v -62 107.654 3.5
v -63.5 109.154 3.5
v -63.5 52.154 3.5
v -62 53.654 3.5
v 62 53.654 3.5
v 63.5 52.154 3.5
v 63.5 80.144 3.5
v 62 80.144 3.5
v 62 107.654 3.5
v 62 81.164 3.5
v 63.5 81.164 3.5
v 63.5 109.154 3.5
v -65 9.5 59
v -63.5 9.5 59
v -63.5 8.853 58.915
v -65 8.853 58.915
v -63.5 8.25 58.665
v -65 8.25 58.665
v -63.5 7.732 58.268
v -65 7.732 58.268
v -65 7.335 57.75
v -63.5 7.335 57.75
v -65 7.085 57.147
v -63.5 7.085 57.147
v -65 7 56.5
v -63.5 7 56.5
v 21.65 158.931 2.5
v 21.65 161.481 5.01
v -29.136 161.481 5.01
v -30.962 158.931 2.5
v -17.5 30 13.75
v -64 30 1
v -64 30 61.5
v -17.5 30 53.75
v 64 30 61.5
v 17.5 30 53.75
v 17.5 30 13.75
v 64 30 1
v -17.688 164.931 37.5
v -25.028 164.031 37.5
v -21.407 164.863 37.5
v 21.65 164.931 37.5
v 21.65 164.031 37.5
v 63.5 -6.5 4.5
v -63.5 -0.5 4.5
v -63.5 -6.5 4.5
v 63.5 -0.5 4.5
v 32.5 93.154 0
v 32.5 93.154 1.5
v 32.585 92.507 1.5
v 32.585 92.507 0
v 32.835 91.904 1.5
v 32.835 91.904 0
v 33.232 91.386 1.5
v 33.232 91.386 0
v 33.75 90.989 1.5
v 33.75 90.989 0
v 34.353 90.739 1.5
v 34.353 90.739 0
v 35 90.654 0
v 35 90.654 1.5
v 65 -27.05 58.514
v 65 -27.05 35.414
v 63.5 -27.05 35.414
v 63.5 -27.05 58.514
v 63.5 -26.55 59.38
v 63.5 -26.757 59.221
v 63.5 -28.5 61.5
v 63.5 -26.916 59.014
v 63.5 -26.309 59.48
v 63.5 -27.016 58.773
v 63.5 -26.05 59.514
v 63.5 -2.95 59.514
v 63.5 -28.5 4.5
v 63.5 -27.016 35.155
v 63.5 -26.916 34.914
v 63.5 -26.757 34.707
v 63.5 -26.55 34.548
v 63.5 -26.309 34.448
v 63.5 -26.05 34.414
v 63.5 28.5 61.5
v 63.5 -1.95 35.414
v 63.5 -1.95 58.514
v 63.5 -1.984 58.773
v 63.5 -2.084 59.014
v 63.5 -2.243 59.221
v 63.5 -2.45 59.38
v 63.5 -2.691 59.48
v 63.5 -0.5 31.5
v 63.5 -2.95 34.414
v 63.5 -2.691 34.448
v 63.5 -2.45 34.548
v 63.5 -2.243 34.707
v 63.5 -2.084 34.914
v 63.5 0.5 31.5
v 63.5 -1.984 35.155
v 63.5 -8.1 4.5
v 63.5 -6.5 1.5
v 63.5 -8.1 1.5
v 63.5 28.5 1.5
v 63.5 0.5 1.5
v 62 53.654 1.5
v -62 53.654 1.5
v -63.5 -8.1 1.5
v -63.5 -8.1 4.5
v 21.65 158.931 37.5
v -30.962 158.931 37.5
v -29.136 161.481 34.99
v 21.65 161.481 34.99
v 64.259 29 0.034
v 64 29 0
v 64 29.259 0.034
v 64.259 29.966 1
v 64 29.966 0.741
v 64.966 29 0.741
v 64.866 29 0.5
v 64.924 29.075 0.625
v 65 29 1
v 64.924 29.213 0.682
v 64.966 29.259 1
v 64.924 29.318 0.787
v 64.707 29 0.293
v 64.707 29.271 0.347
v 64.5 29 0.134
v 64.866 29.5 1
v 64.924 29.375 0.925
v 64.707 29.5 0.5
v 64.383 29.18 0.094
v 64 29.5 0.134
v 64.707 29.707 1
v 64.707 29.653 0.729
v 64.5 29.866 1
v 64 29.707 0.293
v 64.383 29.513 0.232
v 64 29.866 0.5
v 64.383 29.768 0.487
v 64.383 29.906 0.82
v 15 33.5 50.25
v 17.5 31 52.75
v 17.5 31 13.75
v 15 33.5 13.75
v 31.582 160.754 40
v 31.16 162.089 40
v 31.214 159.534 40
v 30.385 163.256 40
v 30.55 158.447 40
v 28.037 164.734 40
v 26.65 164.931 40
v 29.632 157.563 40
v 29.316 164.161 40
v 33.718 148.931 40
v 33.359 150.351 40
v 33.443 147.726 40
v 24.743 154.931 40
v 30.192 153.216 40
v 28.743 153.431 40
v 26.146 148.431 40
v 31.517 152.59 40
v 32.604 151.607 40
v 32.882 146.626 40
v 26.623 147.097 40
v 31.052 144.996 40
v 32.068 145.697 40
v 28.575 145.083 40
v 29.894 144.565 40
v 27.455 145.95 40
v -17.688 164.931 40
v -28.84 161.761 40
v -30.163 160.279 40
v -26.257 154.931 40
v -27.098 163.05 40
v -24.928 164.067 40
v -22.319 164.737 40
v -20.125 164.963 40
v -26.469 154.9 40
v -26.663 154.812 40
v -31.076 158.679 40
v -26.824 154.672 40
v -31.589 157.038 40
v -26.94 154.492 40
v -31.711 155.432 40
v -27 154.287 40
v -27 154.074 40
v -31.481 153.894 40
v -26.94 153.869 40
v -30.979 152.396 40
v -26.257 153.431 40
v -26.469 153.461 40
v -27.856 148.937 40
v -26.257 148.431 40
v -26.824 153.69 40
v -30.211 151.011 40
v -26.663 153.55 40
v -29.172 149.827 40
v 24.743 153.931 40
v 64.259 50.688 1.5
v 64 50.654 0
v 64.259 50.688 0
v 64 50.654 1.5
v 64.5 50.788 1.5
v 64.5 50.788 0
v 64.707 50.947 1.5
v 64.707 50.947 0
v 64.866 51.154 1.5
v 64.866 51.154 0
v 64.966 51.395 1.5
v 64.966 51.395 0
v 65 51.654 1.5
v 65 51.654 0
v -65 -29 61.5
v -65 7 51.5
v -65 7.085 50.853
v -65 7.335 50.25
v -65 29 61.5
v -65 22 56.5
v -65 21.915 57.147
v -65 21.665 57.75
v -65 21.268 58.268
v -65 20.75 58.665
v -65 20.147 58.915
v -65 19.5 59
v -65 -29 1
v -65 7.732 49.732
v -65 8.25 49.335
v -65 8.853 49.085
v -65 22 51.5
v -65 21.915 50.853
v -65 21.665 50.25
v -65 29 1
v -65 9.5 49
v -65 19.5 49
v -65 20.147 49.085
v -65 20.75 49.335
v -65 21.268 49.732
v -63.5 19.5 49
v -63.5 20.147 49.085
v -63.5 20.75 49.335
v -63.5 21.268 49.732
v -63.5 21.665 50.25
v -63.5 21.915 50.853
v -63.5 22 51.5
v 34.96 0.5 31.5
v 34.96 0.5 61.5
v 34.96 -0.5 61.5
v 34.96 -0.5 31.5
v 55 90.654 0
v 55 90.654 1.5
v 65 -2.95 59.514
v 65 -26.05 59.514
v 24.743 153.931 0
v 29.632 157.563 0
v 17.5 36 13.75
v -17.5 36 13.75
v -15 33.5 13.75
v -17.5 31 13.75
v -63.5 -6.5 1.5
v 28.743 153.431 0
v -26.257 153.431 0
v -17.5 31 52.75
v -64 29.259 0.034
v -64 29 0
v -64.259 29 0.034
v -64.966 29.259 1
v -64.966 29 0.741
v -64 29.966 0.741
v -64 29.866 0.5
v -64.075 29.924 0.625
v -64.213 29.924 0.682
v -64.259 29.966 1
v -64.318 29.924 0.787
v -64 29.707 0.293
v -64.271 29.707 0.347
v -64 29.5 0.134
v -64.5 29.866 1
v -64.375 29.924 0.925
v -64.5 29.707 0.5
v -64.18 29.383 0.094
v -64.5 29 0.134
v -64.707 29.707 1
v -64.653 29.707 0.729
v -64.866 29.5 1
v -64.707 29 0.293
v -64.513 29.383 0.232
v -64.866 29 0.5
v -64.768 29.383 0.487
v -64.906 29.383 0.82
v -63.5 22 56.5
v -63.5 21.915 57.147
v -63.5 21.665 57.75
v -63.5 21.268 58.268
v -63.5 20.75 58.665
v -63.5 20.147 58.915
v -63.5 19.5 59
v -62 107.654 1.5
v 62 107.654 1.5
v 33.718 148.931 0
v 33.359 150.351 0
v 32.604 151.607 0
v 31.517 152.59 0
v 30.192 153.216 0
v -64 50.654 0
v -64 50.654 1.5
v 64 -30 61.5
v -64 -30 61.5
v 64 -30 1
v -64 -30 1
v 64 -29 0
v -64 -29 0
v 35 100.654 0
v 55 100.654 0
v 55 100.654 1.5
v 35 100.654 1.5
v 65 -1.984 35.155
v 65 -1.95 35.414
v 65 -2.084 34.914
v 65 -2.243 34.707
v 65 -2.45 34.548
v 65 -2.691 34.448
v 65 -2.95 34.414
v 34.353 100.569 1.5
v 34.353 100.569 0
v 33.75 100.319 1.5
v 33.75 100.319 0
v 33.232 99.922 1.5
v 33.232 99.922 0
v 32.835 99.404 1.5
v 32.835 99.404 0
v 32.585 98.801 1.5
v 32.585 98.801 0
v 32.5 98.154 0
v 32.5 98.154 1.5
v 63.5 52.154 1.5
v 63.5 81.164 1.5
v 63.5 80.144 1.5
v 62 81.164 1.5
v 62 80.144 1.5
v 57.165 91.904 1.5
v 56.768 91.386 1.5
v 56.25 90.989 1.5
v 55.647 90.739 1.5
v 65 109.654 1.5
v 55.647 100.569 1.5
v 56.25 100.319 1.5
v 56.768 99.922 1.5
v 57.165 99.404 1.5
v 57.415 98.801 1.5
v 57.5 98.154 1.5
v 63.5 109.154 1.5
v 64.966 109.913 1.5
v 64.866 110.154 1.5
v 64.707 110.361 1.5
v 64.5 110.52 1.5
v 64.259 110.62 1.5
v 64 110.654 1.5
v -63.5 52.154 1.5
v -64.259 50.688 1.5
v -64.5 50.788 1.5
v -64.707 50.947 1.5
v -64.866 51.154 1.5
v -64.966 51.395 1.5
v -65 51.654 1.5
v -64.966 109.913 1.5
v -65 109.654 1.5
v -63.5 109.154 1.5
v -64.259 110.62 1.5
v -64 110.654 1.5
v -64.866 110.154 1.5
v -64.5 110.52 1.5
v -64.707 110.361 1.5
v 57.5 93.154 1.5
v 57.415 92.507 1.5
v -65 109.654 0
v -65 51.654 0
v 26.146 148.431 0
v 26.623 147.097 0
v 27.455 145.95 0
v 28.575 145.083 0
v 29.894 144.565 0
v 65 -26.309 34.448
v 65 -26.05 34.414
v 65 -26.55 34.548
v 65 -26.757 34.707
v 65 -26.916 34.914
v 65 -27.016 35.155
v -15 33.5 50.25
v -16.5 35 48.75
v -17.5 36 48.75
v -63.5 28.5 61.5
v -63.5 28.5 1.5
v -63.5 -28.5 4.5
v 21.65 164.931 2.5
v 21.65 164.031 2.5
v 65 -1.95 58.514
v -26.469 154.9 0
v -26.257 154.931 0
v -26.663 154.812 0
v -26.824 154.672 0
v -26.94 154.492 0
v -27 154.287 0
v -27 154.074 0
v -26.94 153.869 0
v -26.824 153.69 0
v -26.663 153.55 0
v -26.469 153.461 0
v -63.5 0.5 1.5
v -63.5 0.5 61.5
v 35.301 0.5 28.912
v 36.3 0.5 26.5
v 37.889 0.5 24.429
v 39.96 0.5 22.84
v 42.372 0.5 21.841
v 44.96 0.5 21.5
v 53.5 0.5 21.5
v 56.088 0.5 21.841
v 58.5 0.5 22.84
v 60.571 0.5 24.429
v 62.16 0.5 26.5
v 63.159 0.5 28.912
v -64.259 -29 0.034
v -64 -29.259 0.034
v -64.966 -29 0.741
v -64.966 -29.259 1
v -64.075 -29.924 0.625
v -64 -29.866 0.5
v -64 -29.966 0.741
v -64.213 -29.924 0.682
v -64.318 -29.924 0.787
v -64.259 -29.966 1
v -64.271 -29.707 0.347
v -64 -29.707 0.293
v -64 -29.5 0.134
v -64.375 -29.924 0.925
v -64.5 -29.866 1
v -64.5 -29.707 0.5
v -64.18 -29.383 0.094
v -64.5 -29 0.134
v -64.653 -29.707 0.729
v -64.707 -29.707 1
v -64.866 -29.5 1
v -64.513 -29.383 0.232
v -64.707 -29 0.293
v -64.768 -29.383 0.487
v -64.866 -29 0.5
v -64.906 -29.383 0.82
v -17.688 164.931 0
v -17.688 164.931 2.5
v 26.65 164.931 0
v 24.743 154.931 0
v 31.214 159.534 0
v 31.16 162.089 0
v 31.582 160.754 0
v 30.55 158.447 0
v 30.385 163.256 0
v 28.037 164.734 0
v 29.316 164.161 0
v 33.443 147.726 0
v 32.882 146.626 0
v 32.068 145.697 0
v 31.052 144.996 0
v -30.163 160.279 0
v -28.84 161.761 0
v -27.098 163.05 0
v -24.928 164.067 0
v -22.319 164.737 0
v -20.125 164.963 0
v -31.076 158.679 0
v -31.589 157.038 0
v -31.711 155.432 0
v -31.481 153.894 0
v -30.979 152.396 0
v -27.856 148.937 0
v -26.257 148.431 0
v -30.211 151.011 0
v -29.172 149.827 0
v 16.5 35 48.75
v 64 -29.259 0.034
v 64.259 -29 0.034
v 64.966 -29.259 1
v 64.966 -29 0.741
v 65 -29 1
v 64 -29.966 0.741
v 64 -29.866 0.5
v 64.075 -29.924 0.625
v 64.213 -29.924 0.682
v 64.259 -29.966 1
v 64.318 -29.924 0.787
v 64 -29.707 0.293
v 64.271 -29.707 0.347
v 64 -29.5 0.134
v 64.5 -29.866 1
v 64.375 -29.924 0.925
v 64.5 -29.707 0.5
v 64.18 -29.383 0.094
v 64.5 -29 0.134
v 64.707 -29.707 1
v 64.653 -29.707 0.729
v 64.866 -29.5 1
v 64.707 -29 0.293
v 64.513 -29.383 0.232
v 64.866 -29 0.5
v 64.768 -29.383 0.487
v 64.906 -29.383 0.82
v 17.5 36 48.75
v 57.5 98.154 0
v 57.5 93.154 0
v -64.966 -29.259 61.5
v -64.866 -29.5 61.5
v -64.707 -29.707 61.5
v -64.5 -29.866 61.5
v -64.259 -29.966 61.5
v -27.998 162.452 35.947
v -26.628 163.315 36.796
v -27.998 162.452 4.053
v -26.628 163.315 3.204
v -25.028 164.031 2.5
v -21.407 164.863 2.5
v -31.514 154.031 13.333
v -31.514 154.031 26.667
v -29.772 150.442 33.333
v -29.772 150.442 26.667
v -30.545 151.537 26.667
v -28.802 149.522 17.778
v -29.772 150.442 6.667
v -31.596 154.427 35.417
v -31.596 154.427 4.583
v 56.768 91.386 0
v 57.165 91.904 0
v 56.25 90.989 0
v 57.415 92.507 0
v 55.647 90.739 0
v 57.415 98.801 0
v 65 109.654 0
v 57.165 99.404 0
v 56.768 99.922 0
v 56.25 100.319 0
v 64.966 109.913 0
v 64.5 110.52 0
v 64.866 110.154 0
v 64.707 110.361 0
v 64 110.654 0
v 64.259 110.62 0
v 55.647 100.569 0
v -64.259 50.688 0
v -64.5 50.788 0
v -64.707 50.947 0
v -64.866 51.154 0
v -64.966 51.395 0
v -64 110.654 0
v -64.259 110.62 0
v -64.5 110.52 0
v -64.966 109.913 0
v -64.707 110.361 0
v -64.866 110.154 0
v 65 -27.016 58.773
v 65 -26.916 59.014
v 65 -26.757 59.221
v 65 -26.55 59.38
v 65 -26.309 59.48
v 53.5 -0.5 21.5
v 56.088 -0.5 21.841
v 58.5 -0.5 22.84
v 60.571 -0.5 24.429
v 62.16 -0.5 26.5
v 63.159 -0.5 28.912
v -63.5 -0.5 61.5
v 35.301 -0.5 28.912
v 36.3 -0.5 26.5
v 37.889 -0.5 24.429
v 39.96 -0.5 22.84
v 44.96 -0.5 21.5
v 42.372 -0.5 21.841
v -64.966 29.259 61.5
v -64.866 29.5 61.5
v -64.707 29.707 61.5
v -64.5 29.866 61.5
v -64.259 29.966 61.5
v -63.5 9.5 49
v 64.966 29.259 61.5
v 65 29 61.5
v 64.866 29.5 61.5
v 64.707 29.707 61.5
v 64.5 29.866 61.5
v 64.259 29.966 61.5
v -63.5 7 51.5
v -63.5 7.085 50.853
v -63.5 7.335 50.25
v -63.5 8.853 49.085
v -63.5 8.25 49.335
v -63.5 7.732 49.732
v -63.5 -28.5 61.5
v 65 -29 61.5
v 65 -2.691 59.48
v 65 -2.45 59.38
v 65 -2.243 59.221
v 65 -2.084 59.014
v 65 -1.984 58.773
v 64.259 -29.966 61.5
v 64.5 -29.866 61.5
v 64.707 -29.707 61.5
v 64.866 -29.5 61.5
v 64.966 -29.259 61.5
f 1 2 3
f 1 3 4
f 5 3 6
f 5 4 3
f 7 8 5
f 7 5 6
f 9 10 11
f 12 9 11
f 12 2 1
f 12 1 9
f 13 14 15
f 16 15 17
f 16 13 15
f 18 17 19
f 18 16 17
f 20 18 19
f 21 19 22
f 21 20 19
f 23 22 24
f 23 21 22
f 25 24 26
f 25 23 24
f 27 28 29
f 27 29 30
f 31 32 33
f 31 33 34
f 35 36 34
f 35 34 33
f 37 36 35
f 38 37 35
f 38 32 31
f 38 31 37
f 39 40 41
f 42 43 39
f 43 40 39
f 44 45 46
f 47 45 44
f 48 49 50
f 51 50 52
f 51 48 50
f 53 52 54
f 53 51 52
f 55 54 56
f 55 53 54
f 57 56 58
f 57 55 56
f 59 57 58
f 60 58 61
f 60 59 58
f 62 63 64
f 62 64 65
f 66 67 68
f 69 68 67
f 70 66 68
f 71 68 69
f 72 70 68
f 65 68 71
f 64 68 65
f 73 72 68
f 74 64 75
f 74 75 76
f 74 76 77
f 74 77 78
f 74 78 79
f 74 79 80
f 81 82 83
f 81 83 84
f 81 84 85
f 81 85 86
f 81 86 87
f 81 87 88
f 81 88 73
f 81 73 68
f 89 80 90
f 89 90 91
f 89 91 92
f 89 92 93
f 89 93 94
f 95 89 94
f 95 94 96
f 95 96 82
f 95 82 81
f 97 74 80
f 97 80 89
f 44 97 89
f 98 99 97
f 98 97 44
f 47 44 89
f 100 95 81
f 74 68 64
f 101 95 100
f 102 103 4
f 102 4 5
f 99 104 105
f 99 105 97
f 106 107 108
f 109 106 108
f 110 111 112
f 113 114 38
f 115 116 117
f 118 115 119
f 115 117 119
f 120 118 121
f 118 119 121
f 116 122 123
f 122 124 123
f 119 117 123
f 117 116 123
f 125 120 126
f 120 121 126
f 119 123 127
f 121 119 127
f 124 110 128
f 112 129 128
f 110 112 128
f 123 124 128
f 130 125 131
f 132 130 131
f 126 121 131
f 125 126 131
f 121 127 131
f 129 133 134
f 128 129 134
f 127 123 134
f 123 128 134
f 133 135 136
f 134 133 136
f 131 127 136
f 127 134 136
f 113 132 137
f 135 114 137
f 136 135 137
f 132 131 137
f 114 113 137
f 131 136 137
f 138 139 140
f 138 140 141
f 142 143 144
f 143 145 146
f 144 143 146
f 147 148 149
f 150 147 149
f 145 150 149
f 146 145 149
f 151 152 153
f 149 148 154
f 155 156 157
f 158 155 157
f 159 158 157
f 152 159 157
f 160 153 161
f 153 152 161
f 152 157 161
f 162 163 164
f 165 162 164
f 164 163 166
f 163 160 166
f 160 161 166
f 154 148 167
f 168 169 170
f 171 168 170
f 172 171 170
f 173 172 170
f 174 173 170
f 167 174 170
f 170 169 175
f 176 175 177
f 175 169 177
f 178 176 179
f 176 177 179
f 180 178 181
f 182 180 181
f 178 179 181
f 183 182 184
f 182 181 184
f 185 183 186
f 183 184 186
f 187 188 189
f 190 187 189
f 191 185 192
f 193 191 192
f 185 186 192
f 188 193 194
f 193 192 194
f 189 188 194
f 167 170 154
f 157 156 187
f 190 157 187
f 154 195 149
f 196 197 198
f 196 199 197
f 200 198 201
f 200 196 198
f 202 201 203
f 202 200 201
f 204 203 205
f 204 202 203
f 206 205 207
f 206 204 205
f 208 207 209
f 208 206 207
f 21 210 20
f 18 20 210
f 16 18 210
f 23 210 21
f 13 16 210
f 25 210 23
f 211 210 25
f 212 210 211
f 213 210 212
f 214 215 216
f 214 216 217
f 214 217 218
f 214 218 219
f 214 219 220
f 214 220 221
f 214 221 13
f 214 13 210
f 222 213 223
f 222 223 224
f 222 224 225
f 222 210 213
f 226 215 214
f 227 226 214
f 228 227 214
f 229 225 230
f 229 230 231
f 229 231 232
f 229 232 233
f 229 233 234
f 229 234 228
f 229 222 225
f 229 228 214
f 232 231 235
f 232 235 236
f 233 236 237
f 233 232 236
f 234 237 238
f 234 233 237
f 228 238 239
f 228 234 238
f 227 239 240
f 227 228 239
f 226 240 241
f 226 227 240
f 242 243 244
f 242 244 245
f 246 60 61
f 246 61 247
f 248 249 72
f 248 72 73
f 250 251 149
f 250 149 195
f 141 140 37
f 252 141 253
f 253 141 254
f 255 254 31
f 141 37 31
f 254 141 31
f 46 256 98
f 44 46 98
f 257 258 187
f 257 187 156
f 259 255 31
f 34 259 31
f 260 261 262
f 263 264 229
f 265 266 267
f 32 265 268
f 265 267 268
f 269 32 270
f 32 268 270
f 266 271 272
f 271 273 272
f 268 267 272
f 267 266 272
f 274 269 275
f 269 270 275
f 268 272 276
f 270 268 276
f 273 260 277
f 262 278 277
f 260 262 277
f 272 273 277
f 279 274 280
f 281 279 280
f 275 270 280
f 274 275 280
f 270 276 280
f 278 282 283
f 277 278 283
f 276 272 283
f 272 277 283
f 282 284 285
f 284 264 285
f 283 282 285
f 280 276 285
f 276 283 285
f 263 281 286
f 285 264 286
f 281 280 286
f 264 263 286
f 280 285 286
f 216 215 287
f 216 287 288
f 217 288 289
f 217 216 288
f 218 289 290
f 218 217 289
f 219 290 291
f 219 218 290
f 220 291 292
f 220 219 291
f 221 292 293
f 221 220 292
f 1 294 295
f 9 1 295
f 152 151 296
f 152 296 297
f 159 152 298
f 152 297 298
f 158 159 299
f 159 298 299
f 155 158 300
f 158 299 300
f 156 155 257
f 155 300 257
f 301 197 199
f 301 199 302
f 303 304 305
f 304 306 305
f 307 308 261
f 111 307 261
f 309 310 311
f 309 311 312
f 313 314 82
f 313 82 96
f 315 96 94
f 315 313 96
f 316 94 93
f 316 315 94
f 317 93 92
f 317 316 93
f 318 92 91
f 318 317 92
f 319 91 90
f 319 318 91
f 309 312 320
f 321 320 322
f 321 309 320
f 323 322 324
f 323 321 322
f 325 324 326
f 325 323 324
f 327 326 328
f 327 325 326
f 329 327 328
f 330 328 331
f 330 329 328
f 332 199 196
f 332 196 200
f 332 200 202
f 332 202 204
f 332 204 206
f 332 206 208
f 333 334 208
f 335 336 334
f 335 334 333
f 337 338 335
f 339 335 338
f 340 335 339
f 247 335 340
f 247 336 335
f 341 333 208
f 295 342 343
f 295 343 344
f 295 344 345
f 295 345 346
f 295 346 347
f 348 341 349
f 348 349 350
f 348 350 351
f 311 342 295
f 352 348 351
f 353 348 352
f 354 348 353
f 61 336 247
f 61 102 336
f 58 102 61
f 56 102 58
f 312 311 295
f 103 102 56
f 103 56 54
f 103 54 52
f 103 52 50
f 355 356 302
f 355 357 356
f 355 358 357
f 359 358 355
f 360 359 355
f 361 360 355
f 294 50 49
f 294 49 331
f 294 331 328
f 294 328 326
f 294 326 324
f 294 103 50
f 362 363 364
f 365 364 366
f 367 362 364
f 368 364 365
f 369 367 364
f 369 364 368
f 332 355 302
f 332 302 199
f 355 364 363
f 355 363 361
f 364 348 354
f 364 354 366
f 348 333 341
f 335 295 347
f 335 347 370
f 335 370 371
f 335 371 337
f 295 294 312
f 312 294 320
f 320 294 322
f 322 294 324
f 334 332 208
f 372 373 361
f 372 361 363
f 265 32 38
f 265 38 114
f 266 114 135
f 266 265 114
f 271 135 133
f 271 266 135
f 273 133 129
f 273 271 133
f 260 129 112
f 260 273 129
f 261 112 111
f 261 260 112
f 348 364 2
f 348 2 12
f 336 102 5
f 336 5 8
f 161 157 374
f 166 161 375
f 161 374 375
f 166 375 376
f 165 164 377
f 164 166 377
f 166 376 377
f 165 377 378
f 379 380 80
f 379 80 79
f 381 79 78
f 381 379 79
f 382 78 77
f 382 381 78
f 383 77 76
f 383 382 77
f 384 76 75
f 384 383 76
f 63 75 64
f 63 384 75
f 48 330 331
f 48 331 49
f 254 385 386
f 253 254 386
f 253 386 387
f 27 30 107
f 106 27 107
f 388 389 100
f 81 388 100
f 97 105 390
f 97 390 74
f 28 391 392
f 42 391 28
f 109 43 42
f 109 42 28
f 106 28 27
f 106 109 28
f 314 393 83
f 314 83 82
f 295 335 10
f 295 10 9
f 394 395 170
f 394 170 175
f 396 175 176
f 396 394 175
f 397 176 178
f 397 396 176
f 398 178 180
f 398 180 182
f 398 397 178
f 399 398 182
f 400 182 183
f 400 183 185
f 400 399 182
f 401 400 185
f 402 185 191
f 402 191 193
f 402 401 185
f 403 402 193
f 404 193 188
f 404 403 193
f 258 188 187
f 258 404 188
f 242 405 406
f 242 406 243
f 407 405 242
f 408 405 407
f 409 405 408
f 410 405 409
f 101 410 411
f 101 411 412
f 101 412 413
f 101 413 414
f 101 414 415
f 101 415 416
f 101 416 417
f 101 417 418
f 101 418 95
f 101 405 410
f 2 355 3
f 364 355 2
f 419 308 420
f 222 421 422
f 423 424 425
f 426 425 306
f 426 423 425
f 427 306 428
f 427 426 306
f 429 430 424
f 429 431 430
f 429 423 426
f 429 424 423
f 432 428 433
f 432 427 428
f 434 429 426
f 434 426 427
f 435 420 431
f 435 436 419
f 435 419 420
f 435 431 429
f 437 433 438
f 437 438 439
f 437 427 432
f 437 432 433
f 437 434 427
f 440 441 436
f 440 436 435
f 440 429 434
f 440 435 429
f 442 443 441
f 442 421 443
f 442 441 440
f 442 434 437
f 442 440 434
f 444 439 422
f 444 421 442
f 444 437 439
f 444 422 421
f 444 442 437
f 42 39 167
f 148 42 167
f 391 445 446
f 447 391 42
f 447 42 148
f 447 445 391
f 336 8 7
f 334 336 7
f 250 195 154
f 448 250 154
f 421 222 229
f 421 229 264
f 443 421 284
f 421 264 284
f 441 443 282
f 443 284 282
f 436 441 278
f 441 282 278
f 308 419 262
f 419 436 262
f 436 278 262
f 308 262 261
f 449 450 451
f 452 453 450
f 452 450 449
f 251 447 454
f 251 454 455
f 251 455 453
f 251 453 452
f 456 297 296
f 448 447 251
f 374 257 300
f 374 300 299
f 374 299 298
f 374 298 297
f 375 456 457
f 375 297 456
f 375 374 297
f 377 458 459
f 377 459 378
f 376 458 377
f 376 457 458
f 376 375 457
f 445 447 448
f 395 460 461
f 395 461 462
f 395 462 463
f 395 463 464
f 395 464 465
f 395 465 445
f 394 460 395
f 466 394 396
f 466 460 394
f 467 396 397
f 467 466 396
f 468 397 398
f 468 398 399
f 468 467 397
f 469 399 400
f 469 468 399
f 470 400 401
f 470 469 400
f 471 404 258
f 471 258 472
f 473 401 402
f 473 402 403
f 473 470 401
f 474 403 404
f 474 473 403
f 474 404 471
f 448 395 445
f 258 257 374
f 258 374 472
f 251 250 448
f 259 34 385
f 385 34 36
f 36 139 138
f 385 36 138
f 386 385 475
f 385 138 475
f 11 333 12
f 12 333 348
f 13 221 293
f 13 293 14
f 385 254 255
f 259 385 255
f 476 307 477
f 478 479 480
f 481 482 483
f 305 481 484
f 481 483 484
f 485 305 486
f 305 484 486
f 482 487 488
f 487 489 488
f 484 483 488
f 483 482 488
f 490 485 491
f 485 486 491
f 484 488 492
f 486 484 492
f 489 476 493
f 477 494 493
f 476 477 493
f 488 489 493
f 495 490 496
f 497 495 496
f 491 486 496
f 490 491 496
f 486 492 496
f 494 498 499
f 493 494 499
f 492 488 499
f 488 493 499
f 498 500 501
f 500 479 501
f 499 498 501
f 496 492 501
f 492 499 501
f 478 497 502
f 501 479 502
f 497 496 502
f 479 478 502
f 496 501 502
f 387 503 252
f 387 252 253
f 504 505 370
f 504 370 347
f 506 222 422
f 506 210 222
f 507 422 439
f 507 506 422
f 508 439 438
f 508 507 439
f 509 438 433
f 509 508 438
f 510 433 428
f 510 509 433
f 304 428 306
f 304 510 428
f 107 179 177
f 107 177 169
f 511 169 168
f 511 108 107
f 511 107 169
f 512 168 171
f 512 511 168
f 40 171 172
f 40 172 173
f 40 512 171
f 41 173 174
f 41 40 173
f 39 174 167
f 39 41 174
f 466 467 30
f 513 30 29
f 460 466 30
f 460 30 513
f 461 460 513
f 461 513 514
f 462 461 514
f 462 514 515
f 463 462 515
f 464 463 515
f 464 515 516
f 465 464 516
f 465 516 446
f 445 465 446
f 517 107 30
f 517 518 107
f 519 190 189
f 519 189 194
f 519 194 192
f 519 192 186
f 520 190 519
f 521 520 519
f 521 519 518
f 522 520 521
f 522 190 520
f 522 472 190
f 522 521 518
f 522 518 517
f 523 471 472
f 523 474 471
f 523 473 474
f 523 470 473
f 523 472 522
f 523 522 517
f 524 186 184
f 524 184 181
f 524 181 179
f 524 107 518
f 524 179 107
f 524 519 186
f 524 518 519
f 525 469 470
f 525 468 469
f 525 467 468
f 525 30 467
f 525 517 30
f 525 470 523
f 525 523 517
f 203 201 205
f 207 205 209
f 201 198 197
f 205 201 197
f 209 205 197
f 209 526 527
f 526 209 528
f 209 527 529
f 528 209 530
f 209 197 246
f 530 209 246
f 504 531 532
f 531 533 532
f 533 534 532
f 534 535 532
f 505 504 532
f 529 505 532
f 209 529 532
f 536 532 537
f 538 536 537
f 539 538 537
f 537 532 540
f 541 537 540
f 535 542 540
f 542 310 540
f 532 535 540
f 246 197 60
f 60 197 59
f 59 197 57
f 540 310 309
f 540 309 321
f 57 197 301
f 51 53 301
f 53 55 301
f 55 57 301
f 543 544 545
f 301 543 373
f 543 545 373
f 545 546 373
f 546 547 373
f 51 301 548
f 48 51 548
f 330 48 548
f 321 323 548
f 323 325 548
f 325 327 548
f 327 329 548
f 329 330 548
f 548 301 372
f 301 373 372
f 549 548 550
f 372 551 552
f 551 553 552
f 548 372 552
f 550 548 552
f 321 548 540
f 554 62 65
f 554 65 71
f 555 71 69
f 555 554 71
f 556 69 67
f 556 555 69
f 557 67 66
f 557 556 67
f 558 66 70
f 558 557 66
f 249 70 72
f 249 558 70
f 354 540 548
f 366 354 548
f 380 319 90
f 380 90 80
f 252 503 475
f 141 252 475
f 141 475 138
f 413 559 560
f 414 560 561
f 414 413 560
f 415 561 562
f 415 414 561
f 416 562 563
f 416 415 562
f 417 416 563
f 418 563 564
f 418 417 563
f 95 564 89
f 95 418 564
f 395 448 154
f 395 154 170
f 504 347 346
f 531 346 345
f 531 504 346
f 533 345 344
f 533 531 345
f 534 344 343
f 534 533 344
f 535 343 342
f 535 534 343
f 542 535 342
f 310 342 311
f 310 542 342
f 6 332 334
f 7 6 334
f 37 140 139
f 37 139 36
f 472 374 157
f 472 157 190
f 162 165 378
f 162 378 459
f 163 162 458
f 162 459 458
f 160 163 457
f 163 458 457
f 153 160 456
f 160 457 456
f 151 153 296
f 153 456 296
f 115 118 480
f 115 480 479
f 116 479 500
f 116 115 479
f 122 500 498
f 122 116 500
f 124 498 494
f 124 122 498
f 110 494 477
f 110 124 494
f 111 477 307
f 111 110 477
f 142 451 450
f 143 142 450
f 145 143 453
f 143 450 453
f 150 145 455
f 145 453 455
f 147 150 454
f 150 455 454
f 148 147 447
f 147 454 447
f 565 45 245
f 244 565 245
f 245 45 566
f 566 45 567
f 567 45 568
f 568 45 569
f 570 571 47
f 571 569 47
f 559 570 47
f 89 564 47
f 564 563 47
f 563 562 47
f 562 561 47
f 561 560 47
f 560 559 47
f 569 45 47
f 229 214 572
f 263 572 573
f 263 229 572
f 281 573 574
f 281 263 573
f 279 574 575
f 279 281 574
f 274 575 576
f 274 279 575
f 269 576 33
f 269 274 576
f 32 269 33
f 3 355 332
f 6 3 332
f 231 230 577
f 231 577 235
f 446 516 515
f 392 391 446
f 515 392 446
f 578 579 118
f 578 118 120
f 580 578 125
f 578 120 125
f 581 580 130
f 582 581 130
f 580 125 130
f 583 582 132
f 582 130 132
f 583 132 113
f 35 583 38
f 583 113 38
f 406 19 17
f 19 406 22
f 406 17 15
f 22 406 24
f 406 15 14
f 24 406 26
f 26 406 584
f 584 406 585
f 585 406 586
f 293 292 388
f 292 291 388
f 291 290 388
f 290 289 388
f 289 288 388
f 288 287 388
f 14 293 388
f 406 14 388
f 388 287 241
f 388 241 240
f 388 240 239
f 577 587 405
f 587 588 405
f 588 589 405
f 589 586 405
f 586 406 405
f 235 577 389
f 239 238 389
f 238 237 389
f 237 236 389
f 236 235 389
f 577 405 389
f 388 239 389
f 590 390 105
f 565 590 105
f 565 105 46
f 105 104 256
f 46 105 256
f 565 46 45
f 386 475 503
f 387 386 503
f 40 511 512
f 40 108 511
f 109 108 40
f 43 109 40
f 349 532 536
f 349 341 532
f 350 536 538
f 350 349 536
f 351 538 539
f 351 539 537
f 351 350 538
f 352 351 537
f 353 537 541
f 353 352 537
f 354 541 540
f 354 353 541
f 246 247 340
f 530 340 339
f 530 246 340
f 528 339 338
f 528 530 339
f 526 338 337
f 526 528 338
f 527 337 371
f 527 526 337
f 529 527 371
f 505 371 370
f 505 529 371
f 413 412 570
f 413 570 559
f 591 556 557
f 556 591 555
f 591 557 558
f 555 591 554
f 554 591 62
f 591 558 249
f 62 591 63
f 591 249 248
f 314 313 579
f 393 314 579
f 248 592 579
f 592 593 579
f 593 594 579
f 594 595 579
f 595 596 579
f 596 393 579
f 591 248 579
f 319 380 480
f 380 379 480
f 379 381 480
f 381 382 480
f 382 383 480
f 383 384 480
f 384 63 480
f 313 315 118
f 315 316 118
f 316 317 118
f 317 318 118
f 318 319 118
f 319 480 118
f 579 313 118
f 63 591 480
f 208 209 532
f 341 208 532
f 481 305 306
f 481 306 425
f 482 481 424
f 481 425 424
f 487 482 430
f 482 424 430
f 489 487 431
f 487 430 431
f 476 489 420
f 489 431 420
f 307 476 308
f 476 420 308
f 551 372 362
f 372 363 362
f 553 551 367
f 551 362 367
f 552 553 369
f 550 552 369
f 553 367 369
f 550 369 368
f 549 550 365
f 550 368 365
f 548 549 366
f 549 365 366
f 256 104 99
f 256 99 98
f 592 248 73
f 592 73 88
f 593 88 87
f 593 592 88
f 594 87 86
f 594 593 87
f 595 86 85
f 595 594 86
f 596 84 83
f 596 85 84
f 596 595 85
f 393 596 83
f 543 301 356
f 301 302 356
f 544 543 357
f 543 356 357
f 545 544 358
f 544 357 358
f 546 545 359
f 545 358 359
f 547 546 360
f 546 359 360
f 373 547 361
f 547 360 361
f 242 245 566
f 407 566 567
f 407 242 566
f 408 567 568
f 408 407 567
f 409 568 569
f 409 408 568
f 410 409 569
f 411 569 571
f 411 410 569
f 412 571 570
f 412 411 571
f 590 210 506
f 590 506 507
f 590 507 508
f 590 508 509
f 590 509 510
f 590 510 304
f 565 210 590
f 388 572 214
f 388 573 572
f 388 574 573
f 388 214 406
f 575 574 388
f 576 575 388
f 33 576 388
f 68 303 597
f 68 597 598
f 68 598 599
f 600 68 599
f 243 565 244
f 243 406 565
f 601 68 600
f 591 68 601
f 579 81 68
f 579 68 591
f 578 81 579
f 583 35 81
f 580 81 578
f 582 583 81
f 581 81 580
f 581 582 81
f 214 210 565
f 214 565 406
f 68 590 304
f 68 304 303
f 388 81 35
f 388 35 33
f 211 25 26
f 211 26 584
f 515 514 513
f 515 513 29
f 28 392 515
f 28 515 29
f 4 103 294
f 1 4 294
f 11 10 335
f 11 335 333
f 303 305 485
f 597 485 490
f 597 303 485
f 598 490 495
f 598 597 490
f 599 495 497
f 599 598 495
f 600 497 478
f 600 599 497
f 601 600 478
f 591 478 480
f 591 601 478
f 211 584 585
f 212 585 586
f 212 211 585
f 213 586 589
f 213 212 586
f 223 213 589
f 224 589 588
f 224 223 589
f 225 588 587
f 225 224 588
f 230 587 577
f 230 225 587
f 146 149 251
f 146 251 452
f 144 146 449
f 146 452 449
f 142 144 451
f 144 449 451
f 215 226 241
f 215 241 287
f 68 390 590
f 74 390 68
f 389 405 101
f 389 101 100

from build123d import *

# Parameters (mm, degrees)
CROQUIS1_W              = 60
CROQUIS1_H              = 130
SALIENTE_EXTRUIR1_DEPTH = 1.5
CROQUIS2_W              = 130
CROQUIS2_H              = 60
CROQUIS2_W_2            = 127
CROQUIS2_H_2            = 28
SALIENTE_EXTRUIR2_DEPTH = 60
CORTAR_EXTRUIR1_DEPTH   = 2
CROQUIS4_W              = 127
CROQUIS4_H              = 6
CROQUIS4_H_2            = 20.4
SALIENTE_EXTRUIR3_DEPTH = 3
CORTAR_EXTRUIR2_DEPTH   = 3
CROQUIS6_W              = 60
CROQUIS6_H              = 130
SALIENTE_EXTRUIR4_DEPTH = 1.5
CROQUIS7_W              = 127
CROQUIS7_H              = 57
CROQUIS7_W_2            = 124
CROQUIS7_H_2            = 54
SALIENTE_EXTRUIR5_DEPTH = 2
CORTAR_EXTRUIR3_DEPTH   = 2
CROQUIS9_W              = 1.5
CROQUIS9_H              = 1.02
CORTAR_EXTRUIR4_DEPTH   = 2
CORTAR_EXTRUIR5_DEPTH   = 2
REDONDEO1_R             = 1
REDONDEO2_R             = 1
CROQUIS11_W             = 35
CROQUIS11_H             = 35
SALIENTE_EXTRUIR8_DEPTH = 6
CORTAR_EXTRUIR7_DEPTH   = 45
CHAFL_N1_SIZE           = 5
SALIENTE_EXTRUIR9_DEPTH = 40
CORTAR_EXTRUIR8_START   = -10
CORTAR_EXTRUIR8_DEPTH   = 60
REDONDEO3_R             = 5


with BuildPart() as part:
    # Croquis1 → Saliente-Extruir1 (new body)
    with BuildSketch(Plane(origin=(0, 0, 0), x_dir=(0, 1, 0), z_dir=(0, 0, 1))):
        Rectangle(CROQUIS1_W, CROQUIS1_H)
    extrude(amount=SALIENTE_EXTRUIR1_DEPTH)

    # Croquis2 → Saliente-Extruir2 (add)
    with BuildSketch(Plane.XY.offset(1.5)):
        Rectangle(CROQUIS2_W, CROQUIS2_H)
        with Locations((0, 14.5)):
            Rectangle(CROQUIS2_W_2, CROQUIS2_H_2, mode=Mode.SUBTRACT)
        with Locations((0, -14.5)):
            Rectangle(CROQUIS2_W_2, CROQUIS2_H_2, mode=Mode.SUBTRACT)
    extrude(amount=SALIENTE_EXTRUIR2_DEPTH)

    # Croquis3 → Cortar-Extruir1 (cut)
    with BuildSketch(Plane(origin=(0, 0.5, 0), x_dir=(-1, 0, 0), z_dir=(0, 1, 0))):
        with BuildLine():
            Line((-63.5, 61.5), (-34.96028162, 61.5))
            Line((-34.96028162, 61.5), (-34.96028162, 31.5))
            ThreePointArc((-34.96028162, 31.5), (-37.889213808, 24.428932188), (-44.96028162, 21.5))
            Line((-44.96028162, 21.5), (-53.5, 21.5))
            ThreePointArc((-53.5, 21.5), (-60.571067812, 24.428932188), (-63.5, 31.5))
            Line((-63.5, 31.5), (-63.5, 61.5))
        make_face()
    extrude(amount=-CORTAR_EXTRUIR1_DEPTH, mode=Mode.SUBTRACT)

    # Croquis4 → Saliente-Extruir3 (add)
    with BuildSketch(Plane.XY.offset(1.5)):
        with Locations((0, -3.5)):
            Rectangle(CROQUIS4_W, CROQUIS4_H)
        with Locations((0, -18.3)):
            Rectangle(CROQUIS4_W, CROQUIS4_H_2)
    extrude(amount=SALIENTE_EXTRUIR3_DEPTH)

    # Croquis5 → Cortar-Extruir2 (cut)
    with BuildSketch(Plane(origin=(-65, 0, 0), x_dir=(0, -1, 0), z_dir=(-1, 0, 0))):
        with BuildLine():
            Line((-9.5, 49), (-19.5, 49))
            ThreePointArc((-19.5, 49), (-21.267766953, 49.732233047), (-22, 51.5))
            Line((-22, 51.5), (-22, 56.5))
            ThreePointArc((-22, 56.5), (-21.267766953, 58.267766953), (-19.5, 59))
            Line((-19.5, 59), (-9.5, 59))
            ThreePointArc((-9.5, 59), (-7.732233047, 58.267766953), (-7, 56.5))
            Line((-7, 56.5), (-7, 51.5))
            ThreePointArc((-7, 51.5), (-7.732233047, 49.732233047), (-9.5, 49))
        make_face()
    extrude(amount=-CORTAR_EXTRUIR2_DEPTH, mode=Mode.SUBTRACT)

    # Croquis10 → Cortar-Extruir5 (cut)
    with BuildSketch(Plane.YZ.offset(65)):
        with BuildLine():
            Line((-2.95, 34.41391254), (-26.05, 34.41391254))
            ThreePointArc((-26.05, 34.41391254), (-26.757106781, 34.706805759), (-27.05, 35.41391254))
            Line((-27.05, 35.41391254), (-27.05, 58.51391254))
            ThreePointArc((-27.05, 58.51391254), (-26.757106781, 59.221019322), (-26.05, 59.51391254))
            Line((-26.05, 59.51391254), (-2.95, 59.51391254))
            ThreePointArc((-2.95, 59.51391254), (-2.242893219, 59.221019322), (-1.95, 58.51391254))
            Line((-1.95, 58.51391254), (-1.95, 35.41391254))
            ThreePointArc((-1.95, 35.41391254), (-2.242893219, 34.706805759), (-2.95, 34.41391254))
        make_face()
    extrude(amount=-CORTAR_EXTRUIR5_DEPTH, mode=Mode.SUBTRACT)

    # Redondeo1
    redondeo1_edges = [part.edges().sort_by_distance(p)[0] for p in [
        (-65, 0, 0),
        (0, 30, 0),
        (65, 0, 0),
        (0, -30, 0),
        (-65, -30, 30.75),
        (-65, 30, 30.75),
        (65, 30, 30.75),
        (65, -30, 30.75),
    ]]
    fillet(redondeo1_edges, radius=REDONDEO1_R)

    # Croquis11 → Saliente-Extruir8 (add)
    with BuildSketch(Plane(origin=(0, 30, 0), x_dir=(-1, 0, 0), z_dir=(0, 1, 0))):
        with Locations((0, 31.25)):
            Rectangle(CROQUIS11_W, CROQUIS11_H)
    extrude(amount=SALIENTE_EXTRUIR8_DEPTH)

    # Croquis15 → Cortar-Extruir7 (cut)
    with BuildSketch(Plane.XY.offset(48.75)):
        Polygon((-17.5, 36), (-15, 33.5), (-17.5, 31), align=None)
    cortar_extruir7 = extrude(amount=-CORTAR_EXTRUIR7_DEPTH, mode=Mode.SUBTRACT)

    # Simetría1: Cortar-Extruir7 across plane
    add(cortar_extruir7.mirror(Plane(origin=(0, 0, 0), x_dir=(0, 0, 1), z_dir=(1, 0, 0))), mode=Mode.SUBTRACT)

    # Chaflán1
    # the kernel refuses this chamfer: 5 mm, written as the material it adds along each edge
    with BuildSketch(Plane(origin=(17.5, 30, 48.75), x_dir=(0, -0.027495876610586317, 0.9996219169112968), z_dir=(-1, 0, 0))) as chafl_n1_piece_1_section:
        Polygon((CHAFL_N1_SIZE * 0.999621916911, CHAFL_N1_SIZE * 0.0274958766106), (-CHAFL_N1_SIZE * 0.0274958766106, CHAFL_N1_SIZE * 0.999621916911), (0, 0), align=None)
    chafl_n1_piece_1 = extrude(amount=35, mode=Mode.PRIVATE)
    chafl_n1_piece_1 = split(chafl_n1_piece_1, bisect_by=Plane(origin=(15.432245285, 33.932245285, 48.975102949), z_dir=(-0.7071067811865482, 0.7071067811865468, 0)), keep=Keep.TOP, mode=Mode.PRIVATE)
    chafl_n1_piece_1 = split(chafl_n1_piece_1, bisect_by=Plane(origin=(14.567754715, 33.932245285, 48.975102949), z_dir=(0.7071067811865462, 0.7071067811865488, 0)), keep=Keep.TOP, mode=Mode.PRIVATE)
    add(chafl_n1_piece_1)
    with BuildSketch(Plane(origin=(17.5, 30, 48.75), x_dir=(0, -0.027495876610586317, 0.9996219169112968), z_dir=(-1, 0, 0))) as chafl_n1_piece_2_section:
        Polygon((CHAFL_N1_SIZE * 0.999621916911, CHAFL_N1_SIZE * 0.0274958766106), (-CHAFL_N1_SIZE * 0.0274958766106, CHAFL_N1_SIZE * 0.999621916911), (0, 0), align=None)
    chafl_n1_piece_2 = extrude(amount=35, mode=Mode.PRIVATE)
    chafl_n1_piece_2 = split(chafl_n1_piece_2, bisect_by=Plane(origin=(13.632899662, 32.132899662, 50.773714866), z_dir=(0.7071067811865482, -0.7071067811865468, 0)), keep=Keep.TOP, mode=Mode.PRIVATE)
    chafl_n1_piece_2 = split(chafl_n1_piece_2, bisect_by=Plane(origin=(16.189237839, 32.310762161, 50.773714866), z_dir=(-0.7071067811865462, -0.7071067811865488, 0)), keep=Keep.TOP, mode=Mode.PRIVATE)
    add(chafl_n1_piece_2)
    with BuildSketch(Plane(origin=(17.5, 30, 48.75), x_dir=(0, -0.027495876610586317, 0.9996219169112968), z_dir=(-1, 0, 0))) as chafl_n1_piece_3_section:
        Polygon((CHAFL_N1_SIZE * 0.999621916911, CHAFL_N1_SIZE * 0.0274958766106), (-CHAFL_N1_SIZE * 0.0274958766106, CHAFL_N1_SIZE * 0.999621916911), (0, 0), align=None)
    chafl_n1_piece_3 = extrude(amount=35, mode=Mode.PRIVATE)
    chafl_n1_piece_3 = split(chafl_n1_piece_3, bisect_by=Plane(origin=(-8.376980727, 40.123019273, 50.346819727), z_dir=(0.7071067811865462, -0.7071067811865488, 0)), keep=Keep.TOP, mode=Mode.PRIVATE)
    chafl_n1_piece_3 = split(chafl_n1_piece_3, bisect_by=Plane(origin=(-6.623019273, 25.123019273, 50.346819727), z_dir=(0.7071067811865482, 0.7071067811865468, 0)), keep=Keep.TOP, mode=Mode.PRIVATE)
    chafl_n1_piece_3 = split(chafl_n1_piece_3, bisect_by=Plane(origin=(6.623019273, 25.123019273, 50.346819727), z_dir=(-0.7071067811865482, 0.7071067811865468, 0)), keep=Keep.TOP, mode=Mode.PRIVATE)
    chafl_n1_piece_3 = split(chafl_n1_piece_3, bisect_by=Plane(origin=(8.376980727, 40.123019273, 50.346819727), z_dir=(-0.7071067811865462, -0.7071067811865488, 0)), keep=Keep.TOP, mode=Mode.PRIVATE)
    add(chafl_n1_piece_3)
    with BuildSketch(Plane(origin=(17.5, 30, 48.75), x_dir=(0, -0.027495876610586317, 0.9996219169112968), z_dir=(-1, 0, 0))) as chafl_n1_piece_4_section:
        Polygon((CHAFL_N1_SIZE * 0.999621916911, CHAFL_N1_SIZE * 0.0274958766106), (-CHAFL_N1_SIZE * 0.0274958766106, CHAFL_N1_SIZE * 0.999621916911), (0, 0), align=None)
    chafl_n1_piece_4 = extrude(amount=35, mode=Mode.PRIVATE)
    chafl_n1_piece_4 = split(chafl_n1_piece_4, bisect_by=Plane(origin=(-14.567754715, 33.932245285, 48.975102949), z_dir=(-0.7071067811865462, 0.7071067811865488, 0)), keep=Keep.TOP, mode=Mode.PRIVATE)
    chafl_n1_piece_4 = split(chafl_n1_piece_4, bisect_by=Plane(origin=(-15.432245285, 33.932245285, 48.975102949), z_dir=(0.7071067811865482, 0.7071067811865468, 0)), keep=Keep.TOP, mode=Mode.PRIVATE)
    add(chafl_n1_piece_4)
    with BuildSketch(Plane(origin=(17.5, 30, 48.75), x_dir=(0, -0.027495876610586317, 0.9996219169112968), z_dir=(-1, 0, 0))) as chafl_n1_piece_5_section:
        Polygon((CHAFL_N1_SIZE * 0.999621916911, CHAFL_N1_SIZE * 0.0274958766106), (-CHAFL_N1_SIZE * 0.0274958766106, CHAFL_N1_SIZE * 0.999621916911), (0, 0), align=None)
    chafl_n1_piece_5 = extrude(amount=35, mode=Mode.PRIVATE)
    chafl_n1_piece_5 = split(chafl_n1_piece_5, bisect_by=Plane(origin=(-16.189237839, 32.310762161, 50.773714866), z_dir=(0.7071067811865462, -0.7071067811865488, 0)), keep=Keep.TOP, mode=Mode.PRIVATE)
    chafl_n1_piece_5 = split(chafl_n1_piece_5, bisect_by=Plane(origin=(-13.632899662, 32.132899662, 50.773714866), z_dir=(-0.7071067811865482, -0.7071067811865468, 0)), keep=Keep.TOP, mode=Mode.PRIVATE)
    add(chafl_n1_piece_5)


with BuildPart() as body_2:
    # Croquis6 → Saliente-Extruir4 (new body)
    with BuildSketch(Plane(origin=(0, 0, 0), x_dir=(0, 1, 0), z_dir=(0, 0, 1))):
        with Locations((80.653942152, 0)):
            Rectangle(CROQUIS6_W, CROQUIS6_H)
    extrude(amount=SALIENTE_EXTRUIR4_DEPTH)

    # Croquis7 → Saliente-Extruir5 (add)
    with BuildSketch(Plane.XY.offset(1.5)):
        with Locations((0, 80.653942152)):
            Rectangle(CROQUIS7_W, CROQUIS7_H)
        with Locations((0, 80.653942152)):
            Rectangle(CROQUIS7_W_2, CROQUIS7_H_2, mode=Mode.SUBTRACT)
    extrude(amount=SALIENTE_EXTRUIR5_DEPTH)

    # Croquis8 → Cortar-Extruir3 (cut)
    with BuildSketch(Plane(origin=(0, 0, 0), x_dir=(1, 0, 0), z_dir=(0, 0, -1))):
        with BuildLine():
            Line((55, -100.653942152), (35, -100.653942152))
            ThreePointArc((35, -100.653942152), (33.232233047, -99.921709105), (32.5, -98.153942152))
            Line((32.5, -98.153942152), (32.5, -93.153942152))
            ThreePointArc((32.5, -93.153942152), (33.232233047, -91.386175199), (35, -90.653942152))
            Line((35, -90.653942152), (55, -90.653942152))
            ThreePointArc((55, -90.653942152), (56.767766953, -91.386175199), (57.5, -93.153942152))
            Line((57.5, -93.153942152), (57.5, -98.153942152))
            ThreePointArc((57.5, -98.153942152), (56.767766953, -99.921709105), (55, -100.653942152))
        make_face()
    extrude(amount=-CORTAR_EXTRUIR3_DEPTH, mode=Mode.SUBTRACT)

    # Croquis9 → Cortar-Extruir4 (cut)
    with BuildSketch(Plane.XY.offset(3.5)):
        with Locations((62.75, 80.653942152)):
            Rectangle(CROQUIS9_W, CROQUIS9_H)
    extrude(amount=-CORTAR_EXTRUIR4_DEPTH, mode=Mode.SUBTRACT)

    # Redondeo2
    redondeo2_edges = [body_2.edges().sort_by_distance(p)[0] for p in [
        (-65, 50.653942152, 0.75),
        (-65, 110.653942152, 0.75),
        (65, 110.653942152, 0.75),
        (65, 50.653942152, 0.75),
    ]]
    fillet(redondeo2_edges, radius=REDONDEO2_R)


with BuildPart() as body_3:
    # Croquis16 → Saliente-Extruir9 (new body)
    with BuildSketch(Plane(origin=(0, 0, 0), x_dir=(0, 1, 0), z_dir=(0, 0, 1))):
        with BuildLine():
            Line((153.430673644, 26.257303068), (153.430673644, -33.742696932))
            Line((153.430673644, -33.742696932), (148.430673644, -33.742696932))
            Line((148.430673644, -33.742696932), (144.430673644, -33.742696932))
            Line((144.430673644, -33.742696932), (144.430673644, -26.146137696))
            Line((144.430673644, -26.146137696), (148.430673644, -26.146137696))
            Line((148.430673644, -26.146137696), (148.430673644, 26.257303068))
            add(Edge.make_bspline(
                [(148.430673644, 26.257303068), (148.912637058, 29.212828549), (152.01078713, 31.303928812), (159.394447974, 32.276943324), (165.570615176, 27.287591474), (164.930673644, 17.6884685)],
                knots=[0, 0, 0, 0, 0.351905176, 0.430580995, 1, 1, 1, 1], degree=3))
            Line((164.930673644, 17.6884685), (164.930673644, -31.650384498))
            Line((164.930673644, -31.650384498), (159.061976165, -31.650384498))
            Line((159.061976165, -31.650384498), (153.930673644, -24.742696932))
            Line((153.930673644, -24.742696932), (154.930673644, -24.742696932))
            Line((154.930673644, -24.742696932), (154.930673644, 26.257303068))
            ThreePointArc((154.930673644, 26.257303068), (154.180673644, 27.007303068), (153.430673644, 26.257303068))
        make_face()
    extrude(amount=SALIENTE_EXTRUIR9_DEPTH)

    # Croquis17 → Cortar-Extruir8 (cut)
    with BuildSketch(Plane.YZ.offset(31.650384498).offset(CORTAR_EXTRUIR8_START)):
        Polygon((158.930673644, 37.5), (161.480673644, 34.99), (164.030673644, 37.5), (168.412676556, 37.5), (168.412676556, 2.5), (164.030673644, 2.5), (161.480673644, 5.01), (158.930673644, 2.5), align=None)
    extrude(amount=-CORTAR_EXTRUIR8_DEPTH, mode=Mode.SUBTRACT)

    # Redondeo3
    # the kernel refuses this fillet: 5 mm, written as the material it takes off along each edge
    with BuildSketch(Plane(origin=(26.146137696, 144.430673644, -12.247448714), x_dir=(1, 0, 0), z_dir=(0, 0, 1))) as redondeo3_piece_1:
        with BuildLine():
            CenterArc((4.898979486, 5), REDONDEO3_R, 191.536959033, 78.463040967)
            Line((0, 4), (-0.09797959, 3.98))
            ThreePointArc((-0.09797959, 3.98), (-0.1, 2), (-0.1, 0))
            Line((-0.1, 0), (0, -0.1))
            Line((0, -0.1), (4.898979486, -0.1))
            Line((4.898979486, -0.1), (4.898979486, 0))
        make_face()
    extrude(amount=64.494897428, mode=Mode.SUBTRACT)
    with BuildSketch(Plane(origin=(33.742696932, 144.430673644, -12.5), x_dir=(0, 1, 0), z_dir=(0, 0, 1)), Plane(origin=(33.742696932, 153.430673644, -12.5), x_dir=(-1, 0, 0), z_dir=(0, 0, 1)), Plane(origin=(31.650384498, 164.930673644, -12.5), x_dir=(-1, 0, 0), z_dir=(0, 0, 1))) as redondeo3_piece_2:
        with BuildLine():
            CenterArc((REDONDEO3_R, REDONDEO3_R), REDONDEO3_R, 180, 90)
            Line((0, REDONDEO3_R), (-REDONDEO3_R * 0.02, REDONDEO3_R))
            Line((-REDONDEO3_R * 0.02, REDONDEO3_R), (-REDONDEO3_R * 0.02, -REDONDEO3_R * 0.02))
            Line((-REDONDEO3_R * 0.02, -REDONDEO3_R * 0.02), (REDONDEO3_R, -REDONDEO3_R * 0.02))
            Line((REDONDEO3_R, -REDONDEO3_R * 0.02), (REDONDEO3_R, 0))
        make_face()
    extrude(amount=65, mode=Mode.SUBTRACT)
    with BuildSketch(Plane(origin=(31.650384498, 159.061976165, -6.285967617), x_dir=(0, 1, 0), z_dir=(0, 0, 1))) as redondeo3_piece_3:
        with BuildLine():
            CenterArc((REDONDEO3_R * 0.502877409395, REDONDEO3_R), REDONDEO3_R, 216.606419901, 53.393580099)
            Line((-REDONDEO3_R * 0.299873254705, REDONDEO3_R * 0.403685174353), (-REDONDEO3_R * 0.315928267987, REDONDEO3_R * 0.39175887784))
            Line((-REDONDEO3_R * 0.315928267987, REDONDEO3_R * 0.39175887784), (-REDONDEO3_R * 0.0100575481879, -REDONDEO3_R * 0.02))
            Line((-REDONDEO3_R * 0.0100575481879, -REDONDEO3_R * 0.02), (REDONDEO3_R * 0.502877409395, -REDONDEO3_R * 0.02))
            Line((REDONDEO3_R * 0.502877409395, -REDONDEO3_R * 0.02), (REDONDEO3_R * 0.502877409395, 0))
        make_face()
    extrude(amount=52.571935235, mode=Mode.SUBTRACT)


solid = Compound([part.part, body_2.part, body_3.part])
